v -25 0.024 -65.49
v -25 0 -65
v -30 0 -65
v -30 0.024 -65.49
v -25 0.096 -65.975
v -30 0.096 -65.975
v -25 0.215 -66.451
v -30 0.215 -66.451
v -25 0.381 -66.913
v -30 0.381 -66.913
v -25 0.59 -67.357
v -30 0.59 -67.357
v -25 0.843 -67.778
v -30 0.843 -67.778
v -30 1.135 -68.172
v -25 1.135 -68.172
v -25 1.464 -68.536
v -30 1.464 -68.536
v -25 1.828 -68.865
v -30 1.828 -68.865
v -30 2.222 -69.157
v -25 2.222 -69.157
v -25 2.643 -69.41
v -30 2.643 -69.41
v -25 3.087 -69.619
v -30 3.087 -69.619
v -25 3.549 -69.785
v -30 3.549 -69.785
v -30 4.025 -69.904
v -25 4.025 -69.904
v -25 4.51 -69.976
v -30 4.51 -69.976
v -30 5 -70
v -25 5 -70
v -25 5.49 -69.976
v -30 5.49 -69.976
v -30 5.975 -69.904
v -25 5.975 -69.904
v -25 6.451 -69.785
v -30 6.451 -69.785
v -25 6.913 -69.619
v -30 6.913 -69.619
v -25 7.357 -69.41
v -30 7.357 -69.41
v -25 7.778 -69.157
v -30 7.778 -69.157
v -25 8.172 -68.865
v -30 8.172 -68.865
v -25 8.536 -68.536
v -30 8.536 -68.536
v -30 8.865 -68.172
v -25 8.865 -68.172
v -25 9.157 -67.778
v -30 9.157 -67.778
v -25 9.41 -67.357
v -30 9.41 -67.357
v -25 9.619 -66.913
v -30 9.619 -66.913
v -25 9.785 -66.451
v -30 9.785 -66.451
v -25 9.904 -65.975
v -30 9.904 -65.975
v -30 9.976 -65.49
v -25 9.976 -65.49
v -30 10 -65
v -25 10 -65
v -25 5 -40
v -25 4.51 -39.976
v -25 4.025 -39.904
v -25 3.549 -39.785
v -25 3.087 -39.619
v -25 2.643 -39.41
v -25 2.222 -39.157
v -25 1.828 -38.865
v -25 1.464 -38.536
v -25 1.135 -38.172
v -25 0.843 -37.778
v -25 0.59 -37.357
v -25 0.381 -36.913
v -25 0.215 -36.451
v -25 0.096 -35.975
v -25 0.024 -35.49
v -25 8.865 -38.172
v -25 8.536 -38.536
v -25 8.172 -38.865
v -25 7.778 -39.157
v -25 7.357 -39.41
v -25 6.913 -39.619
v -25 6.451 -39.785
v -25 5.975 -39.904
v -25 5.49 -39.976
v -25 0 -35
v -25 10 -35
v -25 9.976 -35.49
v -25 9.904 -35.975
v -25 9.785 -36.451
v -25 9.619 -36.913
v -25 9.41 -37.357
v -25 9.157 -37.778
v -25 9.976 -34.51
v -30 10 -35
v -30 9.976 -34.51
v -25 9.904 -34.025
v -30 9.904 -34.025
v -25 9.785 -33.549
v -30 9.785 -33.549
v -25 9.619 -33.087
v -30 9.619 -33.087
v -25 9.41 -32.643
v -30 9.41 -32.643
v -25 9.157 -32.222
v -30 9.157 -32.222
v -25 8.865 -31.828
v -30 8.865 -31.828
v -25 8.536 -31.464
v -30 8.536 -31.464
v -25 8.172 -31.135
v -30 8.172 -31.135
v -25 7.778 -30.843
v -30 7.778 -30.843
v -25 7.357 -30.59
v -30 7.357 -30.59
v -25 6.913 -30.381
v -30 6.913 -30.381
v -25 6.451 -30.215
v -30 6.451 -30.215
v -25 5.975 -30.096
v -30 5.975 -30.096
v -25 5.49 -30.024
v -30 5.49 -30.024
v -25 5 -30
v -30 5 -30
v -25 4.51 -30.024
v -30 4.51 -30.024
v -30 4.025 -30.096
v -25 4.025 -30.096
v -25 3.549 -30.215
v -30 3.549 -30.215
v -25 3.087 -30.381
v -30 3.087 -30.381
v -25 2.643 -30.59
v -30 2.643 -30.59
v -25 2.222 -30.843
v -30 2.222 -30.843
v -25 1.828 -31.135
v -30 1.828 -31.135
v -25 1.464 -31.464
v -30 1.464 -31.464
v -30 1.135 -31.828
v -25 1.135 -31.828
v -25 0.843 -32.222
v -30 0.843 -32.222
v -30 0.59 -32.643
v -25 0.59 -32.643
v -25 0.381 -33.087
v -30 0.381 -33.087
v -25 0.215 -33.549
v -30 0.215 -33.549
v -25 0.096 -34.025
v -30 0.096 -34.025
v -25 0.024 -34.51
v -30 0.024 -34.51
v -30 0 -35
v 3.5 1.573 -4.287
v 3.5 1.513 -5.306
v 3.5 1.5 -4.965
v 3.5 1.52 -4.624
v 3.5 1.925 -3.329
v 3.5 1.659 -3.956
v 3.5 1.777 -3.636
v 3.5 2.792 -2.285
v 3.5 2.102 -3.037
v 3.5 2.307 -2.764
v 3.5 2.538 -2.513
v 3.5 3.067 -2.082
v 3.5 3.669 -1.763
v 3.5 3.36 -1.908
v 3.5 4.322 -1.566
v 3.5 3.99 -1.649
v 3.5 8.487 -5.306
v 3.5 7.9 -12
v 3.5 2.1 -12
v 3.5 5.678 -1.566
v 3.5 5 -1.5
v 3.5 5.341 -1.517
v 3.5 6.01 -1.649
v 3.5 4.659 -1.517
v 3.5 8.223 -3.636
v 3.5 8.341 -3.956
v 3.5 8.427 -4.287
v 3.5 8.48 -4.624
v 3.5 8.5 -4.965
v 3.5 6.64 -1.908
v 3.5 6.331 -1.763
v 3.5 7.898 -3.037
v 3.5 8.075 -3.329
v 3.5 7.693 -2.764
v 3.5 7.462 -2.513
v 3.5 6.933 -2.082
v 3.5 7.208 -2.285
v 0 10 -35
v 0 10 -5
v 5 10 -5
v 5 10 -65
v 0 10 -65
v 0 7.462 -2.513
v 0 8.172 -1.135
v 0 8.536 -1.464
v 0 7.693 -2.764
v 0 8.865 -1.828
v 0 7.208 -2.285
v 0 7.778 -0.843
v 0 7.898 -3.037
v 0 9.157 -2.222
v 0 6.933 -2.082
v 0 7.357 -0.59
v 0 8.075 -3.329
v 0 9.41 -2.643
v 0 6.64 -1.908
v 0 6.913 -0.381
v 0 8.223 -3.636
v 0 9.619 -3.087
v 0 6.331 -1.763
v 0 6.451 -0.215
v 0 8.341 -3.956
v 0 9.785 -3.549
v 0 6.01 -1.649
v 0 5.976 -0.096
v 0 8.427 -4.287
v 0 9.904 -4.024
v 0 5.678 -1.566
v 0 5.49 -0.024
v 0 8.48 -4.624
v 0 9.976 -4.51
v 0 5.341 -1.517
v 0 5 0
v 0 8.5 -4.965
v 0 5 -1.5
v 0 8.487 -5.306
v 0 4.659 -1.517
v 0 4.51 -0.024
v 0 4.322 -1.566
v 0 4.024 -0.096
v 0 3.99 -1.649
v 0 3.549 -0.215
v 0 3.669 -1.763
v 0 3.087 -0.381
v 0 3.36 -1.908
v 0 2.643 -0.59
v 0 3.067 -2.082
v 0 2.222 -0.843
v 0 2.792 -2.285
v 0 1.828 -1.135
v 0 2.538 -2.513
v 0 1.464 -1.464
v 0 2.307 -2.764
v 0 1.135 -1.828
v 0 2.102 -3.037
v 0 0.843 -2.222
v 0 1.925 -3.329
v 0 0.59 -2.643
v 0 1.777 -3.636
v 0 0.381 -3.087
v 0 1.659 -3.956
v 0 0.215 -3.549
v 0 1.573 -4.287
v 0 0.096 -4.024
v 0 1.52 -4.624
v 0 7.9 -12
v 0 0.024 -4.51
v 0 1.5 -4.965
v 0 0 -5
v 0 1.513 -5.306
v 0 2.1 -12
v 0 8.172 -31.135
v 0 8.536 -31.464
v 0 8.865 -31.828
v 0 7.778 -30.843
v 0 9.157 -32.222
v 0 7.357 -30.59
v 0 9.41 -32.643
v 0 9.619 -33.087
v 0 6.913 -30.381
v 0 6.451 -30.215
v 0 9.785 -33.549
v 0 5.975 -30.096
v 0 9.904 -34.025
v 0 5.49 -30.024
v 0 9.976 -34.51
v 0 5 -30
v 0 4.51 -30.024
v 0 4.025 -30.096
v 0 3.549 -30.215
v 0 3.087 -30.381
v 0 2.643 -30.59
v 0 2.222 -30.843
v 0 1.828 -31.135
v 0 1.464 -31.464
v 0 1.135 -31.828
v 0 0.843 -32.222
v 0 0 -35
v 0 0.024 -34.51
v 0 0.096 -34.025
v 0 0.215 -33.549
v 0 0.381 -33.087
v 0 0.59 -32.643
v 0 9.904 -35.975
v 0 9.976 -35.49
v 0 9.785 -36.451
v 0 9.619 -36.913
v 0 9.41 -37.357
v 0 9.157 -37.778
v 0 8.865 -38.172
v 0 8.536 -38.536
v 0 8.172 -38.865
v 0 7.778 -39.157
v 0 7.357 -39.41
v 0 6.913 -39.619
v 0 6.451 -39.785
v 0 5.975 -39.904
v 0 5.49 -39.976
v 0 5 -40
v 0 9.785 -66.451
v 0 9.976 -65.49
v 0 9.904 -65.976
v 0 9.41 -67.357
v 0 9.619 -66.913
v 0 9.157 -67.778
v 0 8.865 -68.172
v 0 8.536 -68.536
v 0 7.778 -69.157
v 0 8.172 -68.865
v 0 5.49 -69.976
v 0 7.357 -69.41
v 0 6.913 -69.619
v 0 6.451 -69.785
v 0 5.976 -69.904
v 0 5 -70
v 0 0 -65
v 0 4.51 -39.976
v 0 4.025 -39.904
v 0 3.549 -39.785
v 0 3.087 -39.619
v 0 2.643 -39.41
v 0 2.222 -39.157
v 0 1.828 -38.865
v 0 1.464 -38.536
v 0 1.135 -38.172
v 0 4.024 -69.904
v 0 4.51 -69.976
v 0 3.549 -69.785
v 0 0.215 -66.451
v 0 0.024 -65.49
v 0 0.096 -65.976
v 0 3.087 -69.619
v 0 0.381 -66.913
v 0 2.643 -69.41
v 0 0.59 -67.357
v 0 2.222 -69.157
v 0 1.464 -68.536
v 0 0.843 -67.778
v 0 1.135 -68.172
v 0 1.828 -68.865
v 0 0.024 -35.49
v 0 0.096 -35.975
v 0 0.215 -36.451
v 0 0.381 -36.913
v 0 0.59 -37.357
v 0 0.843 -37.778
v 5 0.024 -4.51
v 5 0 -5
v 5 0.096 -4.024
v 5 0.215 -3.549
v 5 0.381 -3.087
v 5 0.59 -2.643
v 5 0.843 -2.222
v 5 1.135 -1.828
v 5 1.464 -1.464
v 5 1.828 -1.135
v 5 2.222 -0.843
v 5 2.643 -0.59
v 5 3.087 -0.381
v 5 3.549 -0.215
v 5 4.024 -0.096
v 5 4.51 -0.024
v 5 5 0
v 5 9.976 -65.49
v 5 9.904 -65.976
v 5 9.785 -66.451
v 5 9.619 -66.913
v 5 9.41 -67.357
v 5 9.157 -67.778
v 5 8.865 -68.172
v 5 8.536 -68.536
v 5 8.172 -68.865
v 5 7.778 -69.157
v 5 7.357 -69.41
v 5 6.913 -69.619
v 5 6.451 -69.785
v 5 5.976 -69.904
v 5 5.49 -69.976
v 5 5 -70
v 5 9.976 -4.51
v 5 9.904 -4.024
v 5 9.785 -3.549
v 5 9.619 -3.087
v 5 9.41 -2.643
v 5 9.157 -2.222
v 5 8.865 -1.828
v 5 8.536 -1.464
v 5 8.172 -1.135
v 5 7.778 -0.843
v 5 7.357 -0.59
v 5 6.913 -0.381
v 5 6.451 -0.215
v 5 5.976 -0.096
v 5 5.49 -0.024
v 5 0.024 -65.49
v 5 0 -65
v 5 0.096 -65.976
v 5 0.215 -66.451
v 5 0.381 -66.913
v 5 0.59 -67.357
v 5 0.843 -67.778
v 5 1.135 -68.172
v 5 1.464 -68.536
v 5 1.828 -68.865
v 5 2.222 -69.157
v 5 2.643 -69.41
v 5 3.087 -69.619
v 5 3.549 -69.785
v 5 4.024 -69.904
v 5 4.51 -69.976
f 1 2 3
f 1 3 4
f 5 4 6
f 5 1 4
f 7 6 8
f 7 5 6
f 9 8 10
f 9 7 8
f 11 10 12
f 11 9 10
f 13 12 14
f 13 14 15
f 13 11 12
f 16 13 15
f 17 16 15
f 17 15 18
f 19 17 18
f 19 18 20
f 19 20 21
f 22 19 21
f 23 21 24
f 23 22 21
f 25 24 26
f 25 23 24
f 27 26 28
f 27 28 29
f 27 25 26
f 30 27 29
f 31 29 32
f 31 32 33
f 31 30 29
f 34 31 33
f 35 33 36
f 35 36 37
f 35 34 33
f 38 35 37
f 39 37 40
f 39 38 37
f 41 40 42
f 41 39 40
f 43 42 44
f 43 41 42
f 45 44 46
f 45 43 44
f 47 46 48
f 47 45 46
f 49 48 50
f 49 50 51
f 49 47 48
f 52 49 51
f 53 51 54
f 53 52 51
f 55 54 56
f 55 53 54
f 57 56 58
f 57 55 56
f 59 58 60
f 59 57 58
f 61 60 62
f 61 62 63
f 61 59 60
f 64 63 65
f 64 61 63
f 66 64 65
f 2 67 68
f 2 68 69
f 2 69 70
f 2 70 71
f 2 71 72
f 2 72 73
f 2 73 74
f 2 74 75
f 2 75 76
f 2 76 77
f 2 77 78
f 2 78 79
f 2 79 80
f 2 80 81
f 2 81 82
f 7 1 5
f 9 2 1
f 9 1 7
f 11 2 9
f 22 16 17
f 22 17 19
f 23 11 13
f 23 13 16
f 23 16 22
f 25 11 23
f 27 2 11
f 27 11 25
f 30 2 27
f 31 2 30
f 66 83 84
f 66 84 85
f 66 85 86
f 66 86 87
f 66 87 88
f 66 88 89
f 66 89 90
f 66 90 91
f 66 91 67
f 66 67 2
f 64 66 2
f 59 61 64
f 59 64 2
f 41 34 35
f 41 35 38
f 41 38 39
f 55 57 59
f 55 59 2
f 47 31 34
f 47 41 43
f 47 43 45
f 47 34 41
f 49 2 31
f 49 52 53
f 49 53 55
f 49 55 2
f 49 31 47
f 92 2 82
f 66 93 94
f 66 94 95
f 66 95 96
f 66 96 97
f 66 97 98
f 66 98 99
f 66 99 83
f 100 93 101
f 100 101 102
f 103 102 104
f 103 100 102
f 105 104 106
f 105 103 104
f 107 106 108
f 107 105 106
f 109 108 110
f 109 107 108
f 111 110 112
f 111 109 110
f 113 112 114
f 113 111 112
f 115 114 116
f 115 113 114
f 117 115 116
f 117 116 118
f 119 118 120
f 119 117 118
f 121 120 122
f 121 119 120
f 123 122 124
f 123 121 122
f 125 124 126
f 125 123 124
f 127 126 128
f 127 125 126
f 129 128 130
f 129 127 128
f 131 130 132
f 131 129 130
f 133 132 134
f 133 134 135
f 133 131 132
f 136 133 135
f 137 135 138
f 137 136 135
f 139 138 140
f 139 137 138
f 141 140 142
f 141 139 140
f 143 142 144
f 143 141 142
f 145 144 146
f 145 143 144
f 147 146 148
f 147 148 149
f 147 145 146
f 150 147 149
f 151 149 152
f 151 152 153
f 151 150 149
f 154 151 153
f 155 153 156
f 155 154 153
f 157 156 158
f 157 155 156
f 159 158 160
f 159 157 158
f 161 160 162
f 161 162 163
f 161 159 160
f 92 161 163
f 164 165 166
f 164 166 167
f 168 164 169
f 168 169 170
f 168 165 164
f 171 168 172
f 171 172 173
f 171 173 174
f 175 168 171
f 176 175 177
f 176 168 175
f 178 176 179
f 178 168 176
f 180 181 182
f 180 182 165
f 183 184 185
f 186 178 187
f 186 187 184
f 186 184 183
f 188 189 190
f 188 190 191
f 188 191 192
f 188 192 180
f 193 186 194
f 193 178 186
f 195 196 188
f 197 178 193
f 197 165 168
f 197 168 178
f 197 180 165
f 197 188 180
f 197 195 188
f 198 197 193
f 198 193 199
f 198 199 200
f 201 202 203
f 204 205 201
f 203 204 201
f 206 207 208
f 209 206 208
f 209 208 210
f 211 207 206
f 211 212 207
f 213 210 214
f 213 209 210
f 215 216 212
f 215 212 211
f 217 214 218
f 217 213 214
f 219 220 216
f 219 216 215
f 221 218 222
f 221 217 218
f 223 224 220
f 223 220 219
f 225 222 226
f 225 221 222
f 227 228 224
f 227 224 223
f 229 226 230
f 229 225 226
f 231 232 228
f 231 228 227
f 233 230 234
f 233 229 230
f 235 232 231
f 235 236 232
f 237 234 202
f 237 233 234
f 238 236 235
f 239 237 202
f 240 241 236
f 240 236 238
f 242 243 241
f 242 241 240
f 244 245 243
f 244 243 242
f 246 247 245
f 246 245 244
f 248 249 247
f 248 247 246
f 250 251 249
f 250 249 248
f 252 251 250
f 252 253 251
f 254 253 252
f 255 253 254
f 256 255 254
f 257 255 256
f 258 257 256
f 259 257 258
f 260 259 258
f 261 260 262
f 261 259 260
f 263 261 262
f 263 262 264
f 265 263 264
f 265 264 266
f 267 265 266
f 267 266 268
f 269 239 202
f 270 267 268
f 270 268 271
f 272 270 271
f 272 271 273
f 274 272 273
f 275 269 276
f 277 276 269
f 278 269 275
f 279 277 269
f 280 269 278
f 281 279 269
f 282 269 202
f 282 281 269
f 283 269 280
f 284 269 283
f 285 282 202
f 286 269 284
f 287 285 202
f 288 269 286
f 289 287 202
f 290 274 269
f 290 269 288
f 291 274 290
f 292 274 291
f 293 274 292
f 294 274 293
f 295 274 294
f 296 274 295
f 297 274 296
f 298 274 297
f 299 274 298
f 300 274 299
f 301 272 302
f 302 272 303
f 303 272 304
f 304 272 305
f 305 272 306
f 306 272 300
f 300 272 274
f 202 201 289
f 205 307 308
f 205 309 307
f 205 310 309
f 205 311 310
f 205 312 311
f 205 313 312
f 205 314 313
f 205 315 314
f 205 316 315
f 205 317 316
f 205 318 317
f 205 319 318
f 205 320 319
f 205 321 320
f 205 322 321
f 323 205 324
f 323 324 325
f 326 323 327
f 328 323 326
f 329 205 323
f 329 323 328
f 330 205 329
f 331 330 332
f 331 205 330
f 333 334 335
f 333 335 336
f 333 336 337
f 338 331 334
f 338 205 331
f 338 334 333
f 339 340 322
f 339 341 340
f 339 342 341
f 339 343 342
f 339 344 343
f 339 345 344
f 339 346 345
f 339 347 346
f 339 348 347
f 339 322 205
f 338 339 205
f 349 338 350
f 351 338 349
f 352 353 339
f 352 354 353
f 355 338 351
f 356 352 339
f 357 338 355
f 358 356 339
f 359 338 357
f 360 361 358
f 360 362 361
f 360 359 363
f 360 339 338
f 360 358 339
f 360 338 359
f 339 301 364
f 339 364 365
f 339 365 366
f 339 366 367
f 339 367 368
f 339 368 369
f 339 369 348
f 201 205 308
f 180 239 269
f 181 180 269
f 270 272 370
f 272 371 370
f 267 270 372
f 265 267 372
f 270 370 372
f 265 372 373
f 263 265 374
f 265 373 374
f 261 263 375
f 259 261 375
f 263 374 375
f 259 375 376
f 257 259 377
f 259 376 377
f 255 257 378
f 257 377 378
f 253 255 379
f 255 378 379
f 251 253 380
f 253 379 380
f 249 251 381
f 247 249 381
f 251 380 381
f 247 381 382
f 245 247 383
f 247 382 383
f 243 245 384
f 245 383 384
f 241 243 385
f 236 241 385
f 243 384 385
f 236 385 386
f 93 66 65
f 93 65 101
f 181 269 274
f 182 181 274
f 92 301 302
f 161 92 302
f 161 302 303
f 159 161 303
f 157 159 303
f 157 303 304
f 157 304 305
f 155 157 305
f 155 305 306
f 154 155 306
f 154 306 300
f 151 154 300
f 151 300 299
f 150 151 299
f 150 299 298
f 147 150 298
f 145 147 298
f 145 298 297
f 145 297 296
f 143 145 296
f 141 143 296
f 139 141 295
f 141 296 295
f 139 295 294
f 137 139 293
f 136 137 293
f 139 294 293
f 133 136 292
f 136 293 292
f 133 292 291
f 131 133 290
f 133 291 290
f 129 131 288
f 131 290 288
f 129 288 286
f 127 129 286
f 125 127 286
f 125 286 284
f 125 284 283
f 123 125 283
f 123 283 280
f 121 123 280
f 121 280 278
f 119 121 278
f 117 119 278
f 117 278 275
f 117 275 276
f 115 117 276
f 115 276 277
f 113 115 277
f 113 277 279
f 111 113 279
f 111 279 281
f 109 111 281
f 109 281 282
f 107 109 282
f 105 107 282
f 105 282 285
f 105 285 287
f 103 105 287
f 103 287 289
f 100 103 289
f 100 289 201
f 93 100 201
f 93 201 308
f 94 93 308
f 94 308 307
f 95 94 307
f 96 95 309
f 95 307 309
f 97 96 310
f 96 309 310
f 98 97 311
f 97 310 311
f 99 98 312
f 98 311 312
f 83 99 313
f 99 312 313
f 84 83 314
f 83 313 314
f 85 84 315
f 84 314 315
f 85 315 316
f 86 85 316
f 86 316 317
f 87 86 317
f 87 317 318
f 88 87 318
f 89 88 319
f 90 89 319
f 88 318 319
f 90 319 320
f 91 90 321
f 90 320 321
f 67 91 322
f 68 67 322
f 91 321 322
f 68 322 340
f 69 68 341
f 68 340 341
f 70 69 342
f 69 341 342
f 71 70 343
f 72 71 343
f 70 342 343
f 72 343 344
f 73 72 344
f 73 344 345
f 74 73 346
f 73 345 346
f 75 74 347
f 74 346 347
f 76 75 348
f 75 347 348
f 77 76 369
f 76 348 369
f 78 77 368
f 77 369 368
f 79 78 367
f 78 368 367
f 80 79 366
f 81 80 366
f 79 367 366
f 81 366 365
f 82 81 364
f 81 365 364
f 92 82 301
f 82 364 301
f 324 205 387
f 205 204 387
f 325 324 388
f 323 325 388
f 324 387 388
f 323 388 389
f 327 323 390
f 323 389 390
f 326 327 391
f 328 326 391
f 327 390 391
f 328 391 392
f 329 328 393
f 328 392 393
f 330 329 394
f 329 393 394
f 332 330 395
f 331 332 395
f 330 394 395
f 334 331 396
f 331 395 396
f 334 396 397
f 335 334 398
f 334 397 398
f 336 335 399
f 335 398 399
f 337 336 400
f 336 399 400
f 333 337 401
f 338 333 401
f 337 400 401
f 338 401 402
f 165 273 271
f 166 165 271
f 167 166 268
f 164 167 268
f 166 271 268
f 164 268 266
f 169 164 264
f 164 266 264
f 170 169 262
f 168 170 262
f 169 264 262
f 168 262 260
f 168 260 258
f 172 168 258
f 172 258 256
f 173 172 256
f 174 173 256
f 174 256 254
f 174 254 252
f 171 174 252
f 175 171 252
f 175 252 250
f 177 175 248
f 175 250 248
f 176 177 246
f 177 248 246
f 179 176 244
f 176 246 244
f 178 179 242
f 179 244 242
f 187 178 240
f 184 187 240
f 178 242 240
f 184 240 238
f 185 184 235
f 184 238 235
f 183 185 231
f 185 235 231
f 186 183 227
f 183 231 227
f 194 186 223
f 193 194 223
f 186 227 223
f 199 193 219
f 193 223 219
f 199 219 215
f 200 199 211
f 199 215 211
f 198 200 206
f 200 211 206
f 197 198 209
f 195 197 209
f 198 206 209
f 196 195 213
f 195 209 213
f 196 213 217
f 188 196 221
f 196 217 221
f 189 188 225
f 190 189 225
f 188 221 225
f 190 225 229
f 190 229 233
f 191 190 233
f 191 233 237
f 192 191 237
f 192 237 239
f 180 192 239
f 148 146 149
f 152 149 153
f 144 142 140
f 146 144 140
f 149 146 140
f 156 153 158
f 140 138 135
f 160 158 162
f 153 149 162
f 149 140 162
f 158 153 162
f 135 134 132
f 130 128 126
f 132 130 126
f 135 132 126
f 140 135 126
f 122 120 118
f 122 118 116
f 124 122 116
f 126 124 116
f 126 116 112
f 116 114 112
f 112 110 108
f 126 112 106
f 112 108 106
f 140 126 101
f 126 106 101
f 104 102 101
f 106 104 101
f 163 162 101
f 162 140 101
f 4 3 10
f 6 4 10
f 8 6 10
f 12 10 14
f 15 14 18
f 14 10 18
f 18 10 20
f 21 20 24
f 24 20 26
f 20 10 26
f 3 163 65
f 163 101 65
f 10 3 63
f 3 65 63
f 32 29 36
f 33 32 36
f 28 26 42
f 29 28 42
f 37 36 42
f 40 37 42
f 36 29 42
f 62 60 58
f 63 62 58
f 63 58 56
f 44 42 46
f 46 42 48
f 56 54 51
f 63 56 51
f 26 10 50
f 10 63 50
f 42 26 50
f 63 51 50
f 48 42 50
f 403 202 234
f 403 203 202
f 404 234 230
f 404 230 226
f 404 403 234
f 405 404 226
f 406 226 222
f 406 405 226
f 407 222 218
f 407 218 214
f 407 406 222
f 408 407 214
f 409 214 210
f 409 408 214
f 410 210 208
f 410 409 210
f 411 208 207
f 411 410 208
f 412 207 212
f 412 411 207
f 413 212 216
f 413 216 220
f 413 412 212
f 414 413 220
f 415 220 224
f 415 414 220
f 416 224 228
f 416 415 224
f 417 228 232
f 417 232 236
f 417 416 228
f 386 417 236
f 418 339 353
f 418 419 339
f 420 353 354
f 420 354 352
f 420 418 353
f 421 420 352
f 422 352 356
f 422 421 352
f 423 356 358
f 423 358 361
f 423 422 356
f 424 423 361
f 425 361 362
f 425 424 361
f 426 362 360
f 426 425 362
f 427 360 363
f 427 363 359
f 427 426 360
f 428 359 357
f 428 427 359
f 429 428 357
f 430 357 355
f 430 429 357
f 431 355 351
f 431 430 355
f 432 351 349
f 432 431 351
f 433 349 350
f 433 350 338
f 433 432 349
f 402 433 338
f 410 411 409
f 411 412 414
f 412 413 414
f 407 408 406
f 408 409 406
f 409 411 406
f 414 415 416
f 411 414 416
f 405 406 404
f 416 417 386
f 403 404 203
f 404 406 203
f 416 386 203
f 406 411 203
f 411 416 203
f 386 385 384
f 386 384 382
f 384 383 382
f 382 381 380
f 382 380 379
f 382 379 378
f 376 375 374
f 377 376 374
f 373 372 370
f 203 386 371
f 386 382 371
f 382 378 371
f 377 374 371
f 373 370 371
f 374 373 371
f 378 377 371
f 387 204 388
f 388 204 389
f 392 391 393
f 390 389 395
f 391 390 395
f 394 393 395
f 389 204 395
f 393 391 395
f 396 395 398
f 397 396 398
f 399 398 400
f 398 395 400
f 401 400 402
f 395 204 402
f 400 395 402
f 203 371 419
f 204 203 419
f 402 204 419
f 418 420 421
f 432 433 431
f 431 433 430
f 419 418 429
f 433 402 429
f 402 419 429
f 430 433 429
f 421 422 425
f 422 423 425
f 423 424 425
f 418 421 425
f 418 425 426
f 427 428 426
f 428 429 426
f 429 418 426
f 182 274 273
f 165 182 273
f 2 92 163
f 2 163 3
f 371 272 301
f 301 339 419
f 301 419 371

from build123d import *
from build123d.topology import SkipClean

# Parameters (mm, degrees)
IZIM1_W                     = 5
IZIM1_H                     = 70
Y_KSEKLIK_EKSTR_ZYON1_DEPTH = 10
IZIM3_R                     = 3.5
KES_EKSTR_ZYON2_DEPTH       = 3.5
IZIM2_R                     = 5
Y_KSEKLIK_EKSTR_ZYON4_DEPTH = 25
RADYUS1_R                   = 5
Y_KSEKLIK_EKSTR_ZYON5_DEPTH = 5


with BuildPart() as part:
    # Çizim1 → Yükseklik-Ekstrüzyon1 (new body)
    with BuildSketch(Plane(origin=(0, 0, 0), x_dir=(1, 0, 0), z_dir=(0, 1, 0))):
        with Locations((2.5, 35)):
            Rectangle(IZIM1_W, IZIM1_H)
    extrude(amount=Y_KSEKLIK_EKSTR_ZYON1_DEPTH)

    # Çizim3 → Kes-Ekstrüzyon2 (cut)
    with BuildSketch(Plane.ZY):
        with Locations((-5, 5)):
            Circle(IZIM3_R)
        with BuildLine():
            ThreePointArc((-5.305535476, 1.513361494), (-8.5, 5), (-5.305535476, 8.486638506))
            Line((-5.305535476, 8.486638506), (-12, 7.9))
            Line((-12, 7.9), (-12, 2.1))
            Line((-12, 2.1), (-5.305535476, 1.513361494))
        make_face()
    extrude(amount=-KES_EKSTR_ZYON2_DEPTH, mode=Mode.SUBTRACT)

    # Çizim2 → Yükseklik-Ekstrüzyon4 (add)
    with BuildSketch(Plane.ZY):
        with Locations(Location((-35, 5, 0), (0, 0, 270))):
            Circle(IZIM2_R)
    extrude(amount=Y_KSEKLIK_EKSTR_ZYON4_DEPTH)

    # Radyus1
    radyus1_edges = [part.edges().sort_by_distance(p)[0] for p in [
        (2.5, 0, -70),
        (2.5, 0, 0),
        (2.5, 10, 0),
        (2.5, 10, -70),
    ]]
    fillet(radyus1_edges, radius=RADYUS1_R - 0.0001)  # a hair under: the kernel refuses the full size

    # Çizim4 → Yükseklik-Ekstrüzyon5 (add)
    with SkipClean():  # the faces are left unmerged after this step: merging them gives an invalid solid
        with BuildSketch(Plane.ZY.offset(25)):
            with BuildLine():
                Line((-35, 0), (-65, 0))
                ThreePointArc((-65, 0), (-70, 5), (-65, 10))
                Line((-65, 10), (-35, 10))
                ThreePointArc((-35, 10), (-30, 5), (-35, 0))
            make_face()
        extrude(amount=Y_KSEKLIK_EKSTR_ZYON5_DEPTH)
    add(part.part.scale(1), mode=Mode.REPLACE)  # the faces are merged on a copy


solid = part.part
